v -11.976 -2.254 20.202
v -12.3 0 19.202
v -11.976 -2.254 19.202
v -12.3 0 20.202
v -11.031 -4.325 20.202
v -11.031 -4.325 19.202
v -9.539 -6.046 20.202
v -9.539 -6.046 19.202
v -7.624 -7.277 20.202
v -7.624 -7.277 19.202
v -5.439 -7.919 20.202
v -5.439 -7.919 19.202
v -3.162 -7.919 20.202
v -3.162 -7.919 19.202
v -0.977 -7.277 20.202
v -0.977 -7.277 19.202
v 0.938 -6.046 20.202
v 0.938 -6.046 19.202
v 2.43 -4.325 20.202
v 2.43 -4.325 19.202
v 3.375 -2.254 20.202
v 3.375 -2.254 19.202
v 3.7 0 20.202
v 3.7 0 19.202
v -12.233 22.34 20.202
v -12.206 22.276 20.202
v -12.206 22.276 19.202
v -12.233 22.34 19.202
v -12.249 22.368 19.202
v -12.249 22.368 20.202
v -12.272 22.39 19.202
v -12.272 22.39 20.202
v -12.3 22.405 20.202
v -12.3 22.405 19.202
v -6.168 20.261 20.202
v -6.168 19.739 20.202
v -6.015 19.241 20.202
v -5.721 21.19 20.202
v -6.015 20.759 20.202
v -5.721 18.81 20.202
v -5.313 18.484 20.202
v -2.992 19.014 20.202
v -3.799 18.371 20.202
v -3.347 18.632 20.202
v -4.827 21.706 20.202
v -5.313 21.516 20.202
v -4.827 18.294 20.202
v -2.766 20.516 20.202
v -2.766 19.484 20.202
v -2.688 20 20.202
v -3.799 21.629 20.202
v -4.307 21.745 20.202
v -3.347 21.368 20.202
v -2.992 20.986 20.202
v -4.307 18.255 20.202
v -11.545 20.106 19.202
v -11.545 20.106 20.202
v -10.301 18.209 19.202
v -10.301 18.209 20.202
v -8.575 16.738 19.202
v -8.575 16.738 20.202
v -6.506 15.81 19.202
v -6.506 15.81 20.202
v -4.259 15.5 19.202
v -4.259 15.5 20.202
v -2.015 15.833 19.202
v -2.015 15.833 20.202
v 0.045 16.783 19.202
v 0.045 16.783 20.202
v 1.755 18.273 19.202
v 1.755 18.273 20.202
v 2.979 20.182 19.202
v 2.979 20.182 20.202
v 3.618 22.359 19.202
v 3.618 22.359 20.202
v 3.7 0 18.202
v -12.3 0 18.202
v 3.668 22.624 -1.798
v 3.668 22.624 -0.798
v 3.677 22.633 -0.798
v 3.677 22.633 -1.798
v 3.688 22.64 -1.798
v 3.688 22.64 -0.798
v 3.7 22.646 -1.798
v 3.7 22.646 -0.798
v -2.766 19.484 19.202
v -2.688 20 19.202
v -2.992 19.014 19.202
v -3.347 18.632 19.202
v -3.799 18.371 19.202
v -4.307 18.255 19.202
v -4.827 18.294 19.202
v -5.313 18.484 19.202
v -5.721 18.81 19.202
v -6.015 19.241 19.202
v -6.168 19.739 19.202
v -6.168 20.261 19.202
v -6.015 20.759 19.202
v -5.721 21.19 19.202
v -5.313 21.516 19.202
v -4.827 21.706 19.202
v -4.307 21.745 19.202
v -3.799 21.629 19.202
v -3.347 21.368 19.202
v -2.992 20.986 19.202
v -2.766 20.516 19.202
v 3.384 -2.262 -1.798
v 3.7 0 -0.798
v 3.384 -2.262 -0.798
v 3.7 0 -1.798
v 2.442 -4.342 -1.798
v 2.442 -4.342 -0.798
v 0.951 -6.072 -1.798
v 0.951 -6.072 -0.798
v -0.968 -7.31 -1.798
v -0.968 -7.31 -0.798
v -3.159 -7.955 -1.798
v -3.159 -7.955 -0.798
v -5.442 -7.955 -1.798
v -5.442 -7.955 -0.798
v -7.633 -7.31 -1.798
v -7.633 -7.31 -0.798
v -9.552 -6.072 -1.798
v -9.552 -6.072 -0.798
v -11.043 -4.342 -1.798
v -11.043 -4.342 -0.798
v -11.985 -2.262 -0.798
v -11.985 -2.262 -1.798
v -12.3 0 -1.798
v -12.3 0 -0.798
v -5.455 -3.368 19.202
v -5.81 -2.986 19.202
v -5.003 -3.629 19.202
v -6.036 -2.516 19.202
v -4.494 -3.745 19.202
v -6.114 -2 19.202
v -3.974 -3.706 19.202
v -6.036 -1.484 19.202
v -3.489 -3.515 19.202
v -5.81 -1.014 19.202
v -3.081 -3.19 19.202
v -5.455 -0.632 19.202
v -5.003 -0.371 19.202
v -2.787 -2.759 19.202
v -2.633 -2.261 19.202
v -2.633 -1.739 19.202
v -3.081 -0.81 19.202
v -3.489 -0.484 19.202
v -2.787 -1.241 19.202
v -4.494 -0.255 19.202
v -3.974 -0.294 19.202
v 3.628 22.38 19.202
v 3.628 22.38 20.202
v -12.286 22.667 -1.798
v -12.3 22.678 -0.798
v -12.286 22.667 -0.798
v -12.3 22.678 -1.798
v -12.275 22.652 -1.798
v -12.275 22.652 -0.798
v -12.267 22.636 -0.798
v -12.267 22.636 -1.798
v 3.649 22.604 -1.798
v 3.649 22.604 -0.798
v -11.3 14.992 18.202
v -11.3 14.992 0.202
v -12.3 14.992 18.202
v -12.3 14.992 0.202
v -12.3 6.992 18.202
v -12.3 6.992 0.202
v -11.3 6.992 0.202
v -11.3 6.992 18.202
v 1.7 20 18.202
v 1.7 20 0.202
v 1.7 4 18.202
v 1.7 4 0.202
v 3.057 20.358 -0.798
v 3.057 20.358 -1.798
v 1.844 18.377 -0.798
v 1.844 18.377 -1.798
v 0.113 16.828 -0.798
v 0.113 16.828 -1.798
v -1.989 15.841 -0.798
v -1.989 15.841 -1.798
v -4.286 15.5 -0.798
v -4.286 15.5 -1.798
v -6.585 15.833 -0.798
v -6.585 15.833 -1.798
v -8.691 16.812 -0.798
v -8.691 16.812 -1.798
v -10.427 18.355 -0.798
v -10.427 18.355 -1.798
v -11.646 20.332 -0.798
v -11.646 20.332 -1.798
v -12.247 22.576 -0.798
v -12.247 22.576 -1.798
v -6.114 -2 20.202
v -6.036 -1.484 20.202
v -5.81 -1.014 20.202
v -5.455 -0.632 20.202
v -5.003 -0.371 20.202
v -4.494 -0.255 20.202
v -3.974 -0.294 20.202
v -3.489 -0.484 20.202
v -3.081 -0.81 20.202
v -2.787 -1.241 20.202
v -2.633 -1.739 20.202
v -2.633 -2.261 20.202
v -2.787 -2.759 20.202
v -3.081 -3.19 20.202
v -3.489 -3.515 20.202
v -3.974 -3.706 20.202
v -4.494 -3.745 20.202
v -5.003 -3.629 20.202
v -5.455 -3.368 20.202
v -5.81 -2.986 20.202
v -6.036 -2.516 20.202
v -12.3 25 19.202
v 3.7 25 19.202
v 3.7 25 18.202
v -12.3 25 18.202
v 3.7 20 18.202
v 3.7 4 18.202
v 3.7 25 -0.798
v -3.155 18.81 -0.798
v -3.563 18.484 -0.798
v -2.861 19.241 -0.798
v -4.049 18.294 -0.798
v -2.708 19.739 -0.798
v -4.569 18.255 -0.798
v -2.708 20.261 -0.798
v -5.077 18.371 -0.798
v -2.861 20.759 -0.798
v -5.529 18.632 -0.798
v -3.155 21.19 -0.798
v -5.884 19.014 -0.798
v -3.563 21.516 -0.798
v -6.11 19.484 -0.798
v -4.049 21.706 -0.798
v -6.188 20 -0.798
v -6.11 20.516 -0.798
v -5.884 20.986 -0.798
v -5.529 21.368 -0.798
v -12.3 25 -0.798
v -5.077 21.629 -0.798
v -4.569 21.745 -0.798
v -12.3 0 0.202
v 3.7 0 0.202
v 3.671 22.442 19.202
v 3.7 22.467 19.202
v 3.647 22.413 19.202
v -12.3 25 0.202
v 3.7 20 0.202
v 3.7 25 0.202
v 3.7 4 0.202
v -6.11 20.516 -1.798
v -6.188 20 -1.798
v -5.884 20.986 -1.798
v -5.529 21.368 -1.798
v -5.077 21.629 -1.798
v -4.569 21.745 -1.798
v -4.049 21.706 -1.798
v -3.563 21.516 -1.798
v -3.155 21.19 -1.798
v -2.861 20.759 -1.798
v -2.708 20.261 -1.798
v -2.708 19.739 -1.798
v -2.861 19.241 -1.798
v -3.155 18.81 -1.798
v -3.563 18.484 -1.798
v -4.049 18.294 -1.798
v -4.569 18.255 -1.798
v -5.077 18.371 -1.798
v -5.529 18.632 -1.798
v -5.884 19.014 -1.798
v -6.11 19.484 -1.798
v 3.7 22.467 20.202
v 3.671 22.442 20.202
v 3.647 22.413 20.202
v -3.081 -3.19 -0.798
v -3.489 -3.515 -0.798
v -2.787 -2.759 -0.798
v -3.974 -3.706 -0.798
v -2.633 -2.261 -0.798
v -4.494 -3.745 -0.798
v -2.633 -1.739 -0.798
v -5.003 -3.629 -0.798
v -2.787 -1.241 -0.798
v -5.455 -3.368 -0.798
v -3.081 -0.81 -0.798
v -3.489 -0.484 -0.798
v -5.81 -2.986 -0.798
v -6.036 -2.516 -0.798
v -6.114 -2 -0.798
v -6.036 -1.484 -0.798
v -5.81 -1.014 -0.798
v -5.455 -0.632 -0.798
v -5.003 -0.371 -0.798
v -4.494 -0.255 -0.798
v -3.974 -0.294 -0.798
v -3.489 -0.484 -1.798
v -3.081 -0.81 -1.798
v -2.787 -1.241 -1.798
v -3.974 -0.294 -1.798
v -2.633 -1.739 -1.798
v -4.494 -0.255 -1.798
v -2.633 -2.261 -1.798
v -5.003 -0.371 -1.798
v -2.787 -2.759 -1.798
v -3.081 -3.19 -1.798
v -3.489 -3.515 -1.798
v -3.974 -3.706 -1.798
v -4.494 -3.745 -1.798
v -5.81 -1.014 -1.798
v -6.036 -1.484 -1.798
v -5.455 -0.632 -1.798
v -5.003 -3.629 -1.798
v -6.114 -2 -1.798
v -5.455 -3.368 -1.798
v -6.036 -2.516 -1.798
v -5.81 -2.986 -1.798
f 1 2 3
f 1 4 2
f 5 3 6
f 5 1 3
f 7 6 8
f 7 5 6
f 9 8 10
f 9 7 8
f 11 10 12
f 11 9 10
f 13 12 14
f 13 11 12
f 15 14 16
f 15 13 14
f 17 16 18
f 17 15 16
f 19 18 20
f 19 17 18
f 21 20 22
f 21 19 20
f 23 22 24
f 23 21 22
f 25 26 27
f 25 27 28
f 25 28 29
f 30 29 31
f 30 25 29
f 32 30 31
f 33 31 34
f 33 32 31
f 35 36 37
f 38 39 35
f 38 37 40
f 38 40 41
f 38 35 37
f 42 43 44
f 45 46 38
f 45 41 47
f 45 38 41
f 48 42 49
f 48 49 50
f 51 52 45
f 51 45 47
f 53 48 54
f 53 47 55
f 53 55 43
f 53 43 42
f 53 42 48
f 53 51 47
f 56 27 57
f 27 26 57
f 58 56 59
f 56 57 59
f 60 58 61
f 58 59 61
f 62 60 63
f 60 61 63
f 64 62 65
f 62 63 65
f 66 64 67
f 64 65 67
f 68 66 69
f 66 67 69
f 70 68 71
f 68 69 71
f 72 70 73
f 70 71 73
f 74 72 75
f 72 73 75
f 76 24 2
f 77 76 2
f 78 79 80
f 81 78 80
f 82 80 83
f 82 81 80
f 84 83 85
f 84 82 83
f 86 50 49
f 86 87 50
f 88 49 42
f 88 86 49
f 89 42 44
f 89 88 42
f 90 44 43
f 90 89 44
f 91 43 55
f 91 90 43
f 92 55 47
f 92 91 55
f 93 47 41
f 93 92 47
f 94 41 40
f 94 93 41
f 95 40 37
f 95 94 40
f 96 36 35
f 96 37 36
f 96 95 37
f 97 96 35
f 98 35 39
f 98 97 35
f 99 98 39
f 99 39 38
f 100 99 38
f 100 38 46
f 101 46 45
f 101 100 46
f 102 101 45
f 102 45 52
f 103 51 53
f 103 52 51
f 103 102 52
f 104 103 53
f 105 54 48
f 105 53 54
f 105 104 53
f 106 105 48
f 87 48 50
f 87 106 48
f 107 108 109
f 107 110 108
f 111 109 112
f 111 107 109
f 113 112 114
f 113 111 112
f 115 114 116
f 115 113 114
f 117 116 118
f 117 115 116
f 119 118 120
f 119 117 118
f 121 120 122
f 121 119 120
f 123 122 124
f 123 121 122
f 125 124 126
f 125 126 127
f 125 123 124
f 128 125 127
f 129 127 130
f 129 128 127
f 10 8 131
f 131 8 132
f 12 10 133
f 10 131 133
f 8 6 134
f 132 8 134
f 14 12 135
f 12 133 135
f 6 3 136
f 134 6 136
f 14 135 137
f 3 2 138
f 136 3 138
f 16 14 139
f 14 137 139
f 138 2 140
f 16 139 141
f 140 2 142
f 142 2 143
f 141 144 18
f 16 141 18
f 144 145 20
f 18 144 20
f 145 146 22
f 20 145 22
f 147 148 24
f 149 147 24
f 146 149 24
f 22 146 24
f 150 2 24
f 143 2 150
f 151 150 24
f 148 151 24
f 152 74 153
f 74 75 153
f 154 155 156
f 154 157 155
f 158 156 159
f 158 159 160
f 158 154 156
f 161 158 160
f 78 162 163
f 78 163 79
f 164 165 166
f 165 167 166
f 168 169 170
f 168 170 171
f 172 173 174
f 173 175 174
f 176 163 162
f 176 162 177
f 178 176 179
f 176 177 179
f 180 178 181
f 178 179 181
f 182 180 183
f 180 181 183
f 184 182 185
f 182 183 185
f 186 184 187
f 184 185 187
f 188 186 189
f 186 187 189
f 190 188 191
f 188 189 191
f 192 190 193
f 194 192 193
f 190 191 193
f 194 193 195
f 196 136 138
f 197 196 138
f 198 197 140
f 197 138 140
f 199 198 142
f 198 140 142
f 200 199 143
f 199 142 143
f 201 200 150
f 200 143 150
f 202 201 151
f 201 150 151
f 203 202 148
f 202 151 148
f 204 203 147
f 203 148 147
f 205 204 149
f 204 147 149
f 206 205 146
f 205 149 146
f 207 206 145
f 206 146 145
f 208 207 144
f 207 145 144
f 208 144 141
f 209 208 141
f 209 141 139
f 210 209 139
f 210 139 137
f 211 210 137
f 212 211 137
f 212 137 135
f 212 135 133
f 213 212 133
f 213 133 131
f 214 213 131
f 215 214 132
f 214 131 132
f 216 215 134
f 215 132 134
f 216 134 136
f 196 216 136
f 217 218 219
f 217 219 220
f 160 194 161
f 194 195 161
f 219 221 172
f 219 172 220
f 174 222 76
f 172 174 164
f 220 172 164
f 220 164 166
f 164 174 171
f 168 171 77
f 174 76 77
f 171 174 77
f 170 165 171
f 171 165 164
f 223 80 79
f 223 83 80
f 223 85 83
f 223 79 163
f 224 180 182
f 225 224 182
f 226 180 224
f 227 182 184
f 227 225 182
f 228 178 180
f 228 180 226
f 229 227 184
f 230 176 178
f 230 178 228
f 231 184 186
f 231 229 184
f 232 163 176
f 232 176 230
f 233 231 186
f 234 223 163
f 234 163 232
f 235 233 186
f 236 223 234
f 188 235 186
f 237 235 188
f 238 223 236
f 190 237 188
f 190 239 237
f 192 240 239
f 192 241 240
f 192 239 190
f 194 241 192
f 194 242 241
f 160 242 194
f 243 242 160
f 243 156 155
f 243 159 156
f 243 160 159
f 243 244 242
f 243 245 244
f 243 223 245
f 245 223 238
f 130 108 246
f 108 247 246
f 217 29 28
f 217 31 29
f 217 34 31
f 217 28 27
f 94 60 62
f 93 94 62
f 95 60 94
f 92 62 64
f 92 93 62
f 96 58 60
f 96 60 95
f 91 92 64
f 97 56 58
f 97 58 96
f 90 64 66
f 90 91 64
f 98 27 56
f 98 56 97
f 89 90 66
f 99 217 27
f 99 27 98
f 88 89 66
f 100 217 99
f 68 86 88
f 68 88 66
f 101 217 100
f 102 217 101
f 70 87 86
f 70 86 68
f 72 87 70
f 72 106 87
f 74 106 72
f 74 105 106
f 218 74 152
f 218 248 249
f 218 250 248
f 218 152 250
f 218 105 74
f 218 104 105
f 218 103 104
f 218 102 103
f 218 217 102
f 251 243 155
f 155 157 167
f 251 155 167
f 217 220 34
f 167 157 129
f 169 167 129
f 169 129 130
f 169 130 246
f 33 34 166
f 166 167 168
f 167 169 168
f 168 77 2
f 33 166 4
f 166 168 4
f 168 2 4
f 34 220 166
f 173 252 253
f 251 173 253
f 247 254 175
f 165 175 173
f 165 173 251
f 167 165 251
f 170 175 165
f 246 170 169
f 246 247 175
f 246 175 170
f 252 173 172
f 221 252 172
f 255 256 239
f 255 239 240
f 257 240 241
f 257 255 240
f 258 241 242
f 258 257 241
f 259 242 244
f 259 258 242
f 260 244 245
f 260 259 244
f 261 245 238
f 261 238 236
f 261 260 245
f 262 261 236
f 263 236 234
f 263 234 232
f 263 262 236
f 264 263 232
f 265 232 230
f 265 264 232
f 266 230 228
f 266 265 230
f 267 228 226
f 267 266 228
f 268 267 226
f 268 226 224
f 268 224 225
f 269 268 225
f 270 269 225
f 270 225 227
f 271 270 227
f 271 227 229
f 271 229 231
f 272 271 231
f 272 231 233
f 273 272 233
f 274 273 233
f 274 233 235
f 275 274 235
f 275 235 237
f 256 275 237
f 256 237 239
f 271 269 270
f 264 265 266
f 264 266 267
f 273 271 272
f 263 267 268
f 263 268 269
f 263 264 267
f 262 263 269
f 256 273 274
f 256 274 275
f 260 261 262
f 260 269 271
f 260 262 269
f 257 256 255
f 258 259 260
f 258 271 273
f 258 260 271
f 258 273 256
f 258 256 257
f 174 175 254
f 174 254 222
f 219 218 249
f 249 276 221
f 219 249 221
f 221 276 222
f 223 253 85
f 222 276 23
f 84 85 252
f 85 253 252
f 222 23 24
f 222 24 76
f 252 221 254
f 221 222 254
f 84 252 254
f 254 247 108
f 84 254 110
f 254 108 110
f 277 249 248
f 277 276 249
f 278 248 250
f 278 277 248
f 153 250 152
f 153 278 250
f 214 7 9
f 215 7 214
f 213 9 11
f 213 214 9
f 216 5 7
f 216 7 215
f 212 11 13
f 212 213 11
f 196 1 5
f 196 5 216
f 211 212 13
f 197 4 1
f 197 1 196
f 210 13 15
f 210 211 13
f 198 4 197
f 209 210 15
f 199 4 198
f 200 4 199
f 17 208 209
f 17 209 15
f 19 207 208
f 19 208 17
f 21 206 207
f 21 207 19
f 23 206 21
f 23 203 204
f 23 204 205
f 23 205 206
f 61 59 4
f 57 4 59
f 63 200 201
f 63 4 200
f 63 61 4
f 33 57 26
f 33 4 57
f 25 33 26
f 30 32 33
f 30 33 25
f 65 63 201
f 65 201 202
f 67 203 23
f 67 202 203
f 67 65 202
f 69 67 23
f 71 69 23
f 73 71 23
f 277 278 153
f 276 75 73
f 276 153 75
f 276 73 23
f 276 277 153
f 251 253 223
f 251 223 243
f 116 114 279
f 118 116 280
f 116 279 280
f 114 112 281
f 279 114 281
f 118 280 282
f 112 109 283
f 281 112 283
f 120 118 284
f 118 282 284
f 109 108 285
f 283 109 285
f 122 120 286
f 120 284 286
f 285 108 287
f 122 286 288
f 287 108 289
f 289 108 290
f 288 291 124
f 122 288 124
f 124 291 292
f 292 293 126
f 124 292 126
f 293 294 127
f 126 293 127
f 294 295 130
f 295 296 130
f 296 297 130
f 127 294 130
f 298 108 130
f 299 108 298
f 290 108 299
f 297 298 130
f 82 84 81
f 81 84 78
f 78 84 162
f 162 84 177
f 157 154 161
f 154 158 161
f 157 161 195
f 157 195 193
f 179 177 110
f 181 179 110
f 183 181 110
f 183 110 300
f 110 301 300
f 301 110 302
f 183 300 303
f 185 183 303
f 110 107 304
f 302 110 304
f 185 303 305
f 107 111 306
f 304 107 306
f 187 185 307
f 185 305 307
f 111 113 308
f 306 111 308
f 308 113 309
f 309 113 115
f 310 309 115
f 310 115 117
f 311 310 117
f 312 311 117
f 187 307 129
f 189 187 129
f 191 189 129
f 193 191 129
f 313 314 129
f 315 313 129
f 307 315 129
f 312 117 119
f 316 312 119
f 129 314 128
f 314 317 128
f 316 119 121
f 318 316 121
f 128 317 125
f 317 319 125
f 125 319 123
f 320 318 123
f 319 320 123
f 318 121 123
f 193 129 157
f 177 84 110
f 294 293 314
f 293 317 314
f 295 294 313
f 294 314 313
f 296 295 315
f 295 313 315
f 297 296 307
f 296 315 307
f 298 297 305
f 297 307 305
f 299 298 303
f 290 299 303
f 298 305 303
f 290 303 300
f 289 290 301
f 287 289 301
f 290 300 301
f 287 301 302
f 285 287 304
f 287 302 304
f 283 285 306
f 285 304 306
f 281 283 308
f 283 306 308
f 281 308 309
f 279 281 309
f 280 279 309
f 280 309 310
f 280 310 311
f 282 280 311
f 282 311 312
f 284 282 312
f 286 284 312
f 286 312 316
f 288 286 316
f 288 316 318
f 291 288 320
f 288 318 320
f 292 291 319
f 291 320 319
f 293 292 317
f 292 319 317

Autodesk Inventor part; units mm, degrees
ref_plane "YZ Plane" through (0, 0, 0) normal (1, 0, 0) x (0, 1, 0)
ref_plane "XZ Plane" through (0, 0, 0) normal (0, 1, 0) x (-1, 0, 0)
ref_plane "XY Plane" through (0, 0, 0) normal (0, 0, 1) x (1, 0, 0)
sketch "Boceto1" plane through (0, 0, 0) normal (0, 1, 0) x (-1, 0, 0)
  line L0 (10.3005, 0.2018) -> (-1.6995, 0.2018)
  line L1 (-1.6995, 0.2018) -> (-1.6995, 18.2018)
  line L2 (-1.6995, 18.2018) -> (10.3005, 18.2018)
  line L3 (12.3005, 20.2018) -> (-3.6995, 20.2018)
  line L4 (-3.6995, 20.2018) -> (-3.6995, -1.7982)
  line L5 (-3.6995, -1.7982) -> (12.3005, -1.7982)
  line L6 (10.3005, 18.2018) -> (12.3005, 18.2018)
  line L7 (10.3005, 0.2018) -> (12.3005, 0.2018)
  line L8 (12.3005, -1.7982) -> (12.3005, 0.2018)
  line L9 (12.3005, 18.2018) -> (12.3005, 20.2018)
  point P0 (0, 0)
  dimension "d0" = 18
  dimension "d1" = 12
extrude "Extrusión1" add sketch "Boceto1" along normal blind 25
sketch "Boceto2" plane through (-12.3005, 0, 20.2018) normal (0, 0, 1) x (1, 0, 0)
  line L0 (16, 0) -> (16, 25) projected
  line L1 (0, 0) -> (14, 0) projected
  arc A0 (0, 0) -> (16, 0) centre (8, 0) ccw
  line L2 (0, 0) -> (16, 0)
sketch "Boceto3" plane through (3.6995, 0, -1.7982) normal (0, 0, -1) x (-1, 0, 0)
  line L0 (0, 0) -> (0, 25) projected
  line L1 (16, 0) -> (16, 25) projected
  arc A0 (0, 0) -> (16, 0) centre (8, -0.0367) ccw
  line L2 (16, 0) -> (0, 0)
  line L3 (16, 0) -> (2, 0) projected
  point P0 (3.6995, 0)
extrude "Extrusión2" add sketch "Boceto3" against normal blind 1
extrude "Extrusión3" add sketch "Boceto2" against normal blind 1
sketch "Boceto5" plane through (3.6995, 25, -1.7982) normal (0, 0, -1) x (-1, 0, 0)
  line L0 (0, 0) -> (16, 0) projected
  line L1 (16, -25) -> (16, 0) projected
  line L2 (16, 0) -> (0, 0)
  line L3 (16, 0) -> (16, -1.5)
  line L4 (16, 0) -> (0, 0)
  line L5 (0, -25) -> (0, 0) projected
  line L6 (0, 0) -> (0, -1.5)
  arc A0 (0.0504, -2.3965) -> (15.9464, -2.4245) centre (8, -1.5) ccw
  line L7 (15.9464, -2.4245) -> (15.9666, -2.3645)
  arc A1 (16, -2.3216) -> (15.9666, -2.3645) centre (16.045, -2.3909) ccw
  line L8 (0.0504, -2.3965) -> (0.0316, -2.3763)
  arc A2 (0.0316, -2.3763) -> (0, -2.3536) centre (-0.0406, -2.4434) ccw
  line L9 (16, -2.3216) -> (16, -1.5)
  line L10 (0, -1.5) -> (0, -2.3536)
  point P0 (3.6995, -25)
  dimension "d13" = 1.5
sketch "Boceto6" plane through (-12.3005, 25, 20.2018) normal (0, 0, 1) x (1, 0, 0)
  line L0 (16, 0) -> (0, 0) projected
  line L1 (16, -25) -> (16, 0) projected
  line L2 (0, 0) -> (16, 0)
  line L3 (0, 0) -> (0, -1.5)
  line L4 (0, -25) -> (0, 0) projected
  arc A0 (0.0942, -2.7242) -> (15.9182, -2.6413) centre (8, -1.5) ccw
  line L5 (16, -1.5) -> (16, 0)
  line L6 (15.9182, -2.6413) -> (15.9286, -2.6198)
  arc A1 (16, -2.5333) -> (15.9286, -2.6198) centre (16.1434, -2.7242) ccw
  line L7 (0.0942, -2.7242) -> (0.0677, -2.6601)
  arc A2 (0.0677, -2.6601) -> (0, -2.5946) centre (-0.0415, -2.7053) ccw
  line L8 (16, -2.5333) -> (16, 0)
  line L9 (0, -2.5946) -> (0, 0)
  point P0 (12.3005, -25)
  dimension "d10" = 1.5
extrude "Extrusión4" cut sketch "Boceto6" against normal blind 1
extrude "Extrusión5" cut sketch "Boceto5" against normal blind 1
sketch "Boceto8" plane through (-4.3005, -0.0367, -1.7982) normal (0, 0, -1) x (-1, 0, 0)
  circle A0 centre (0.1375, 20.0367) radius 1.75
  circle A1 centre (0.0632, -1.9632) radius 1.75
  line L0 (-8, 25.0367) -> (8, 25.0367) projected
  point P0 (-4.3005, 0.0367)
  dimension "d19" = 3.5
  dimension "d20" = 3.5
  dimension "d21" = 22
  dimension "d22" = 5
extrude "Extrusión6" add sketch "Boceto8" against normal blind 1 contours A0
extrude "Extrusión7" cut sketch "Boceto8" against normal blind 30 contours A1
sketch "Boceto9" plane through (-12.3005, 25, 19.2018) normal (0, 0, 1) x (1, 0, 0)
  circle A0 centre (7.8625, -5) radius 1.75 projected
  circle A1 centre (7.8625, -5) radius 1.75
  point P0 (12.3005, -25)
extrude "Extrusión8" add sketch "Boceto9" along normal blind 1
sketch "Boceto10" plane through (-12.3005, 0, 0.2018) normal (-1, 0, 0) x (0, 0, 1)
  line L0 (-2, 0) -> (-2, 22.6784) projected
  line L1 (20, 0) -> (20, 22.4054) projected
  line L2 (0, 14.992) -> (18, 14.992)
  line L3 (0, 6.992) -> (18, 6.992)
  line L4 (0, 0) -> (0, 25) projected
  line L5 (0, 6.992) -> (0, 14.992)
  line L6 (18, 0) -> (18, 25) projected
  line L7 (18, 6.992) -> (18, 14.992)
  point P0 (-0.2018, 0)
  dimension "d32" = 8
extrude "Extrusión9" add sketch "Boceto10" against normal blind 1
sketch "Boceto11" plane through (3.6995, 0, -0.7982) normal (1, 0, 0) x (0, 0, -1)
  point P0 (-0.7982, 0)
sketch "Boceto12" plane through (1.6995, 0, 0.2018) normal (-1, 0, 0) x (0, 0, 1)
  line L0 (0, 14.992) -> (0, 25) projected
  line L1 (0, 25) -> (0, 20)
  line L2 (0, 20) -> (18, 20)
  line L3 (18, 14.992) -> (18, 25) projected
  line L4 (18, 25) -> (0, 25)
  line L5 (19, 25) -> (-1, 25) projected
  line L6 (18, 25) -> (18, 20)
  line L7 (-1, 0) -> (0, 0) projected
  line L8 (0, 0) -> (0, 4)
  line L9 (0, 0) -> (0, 25) projected
  line L10 (0, 4) -> (18, 4)
  line L11 (18, 0) -> (18, 25) projected
  line L12 (0, 0) -> (18, 0) projected
  line L13 (18, 4) -> (18, 0)
  line L14 (18, 0) -> (0, 0)
  point P0 (-0.2018, 0)
  dimension "d35" = 5
  dimension "d36" = 4
extrude "Extrusión10" cut sketch "Boceto12" against normal blind 2 contours L0 L4 L3 L2 | L10 L11 L12 L8
properties part number "Eslabon cadena portacable"
